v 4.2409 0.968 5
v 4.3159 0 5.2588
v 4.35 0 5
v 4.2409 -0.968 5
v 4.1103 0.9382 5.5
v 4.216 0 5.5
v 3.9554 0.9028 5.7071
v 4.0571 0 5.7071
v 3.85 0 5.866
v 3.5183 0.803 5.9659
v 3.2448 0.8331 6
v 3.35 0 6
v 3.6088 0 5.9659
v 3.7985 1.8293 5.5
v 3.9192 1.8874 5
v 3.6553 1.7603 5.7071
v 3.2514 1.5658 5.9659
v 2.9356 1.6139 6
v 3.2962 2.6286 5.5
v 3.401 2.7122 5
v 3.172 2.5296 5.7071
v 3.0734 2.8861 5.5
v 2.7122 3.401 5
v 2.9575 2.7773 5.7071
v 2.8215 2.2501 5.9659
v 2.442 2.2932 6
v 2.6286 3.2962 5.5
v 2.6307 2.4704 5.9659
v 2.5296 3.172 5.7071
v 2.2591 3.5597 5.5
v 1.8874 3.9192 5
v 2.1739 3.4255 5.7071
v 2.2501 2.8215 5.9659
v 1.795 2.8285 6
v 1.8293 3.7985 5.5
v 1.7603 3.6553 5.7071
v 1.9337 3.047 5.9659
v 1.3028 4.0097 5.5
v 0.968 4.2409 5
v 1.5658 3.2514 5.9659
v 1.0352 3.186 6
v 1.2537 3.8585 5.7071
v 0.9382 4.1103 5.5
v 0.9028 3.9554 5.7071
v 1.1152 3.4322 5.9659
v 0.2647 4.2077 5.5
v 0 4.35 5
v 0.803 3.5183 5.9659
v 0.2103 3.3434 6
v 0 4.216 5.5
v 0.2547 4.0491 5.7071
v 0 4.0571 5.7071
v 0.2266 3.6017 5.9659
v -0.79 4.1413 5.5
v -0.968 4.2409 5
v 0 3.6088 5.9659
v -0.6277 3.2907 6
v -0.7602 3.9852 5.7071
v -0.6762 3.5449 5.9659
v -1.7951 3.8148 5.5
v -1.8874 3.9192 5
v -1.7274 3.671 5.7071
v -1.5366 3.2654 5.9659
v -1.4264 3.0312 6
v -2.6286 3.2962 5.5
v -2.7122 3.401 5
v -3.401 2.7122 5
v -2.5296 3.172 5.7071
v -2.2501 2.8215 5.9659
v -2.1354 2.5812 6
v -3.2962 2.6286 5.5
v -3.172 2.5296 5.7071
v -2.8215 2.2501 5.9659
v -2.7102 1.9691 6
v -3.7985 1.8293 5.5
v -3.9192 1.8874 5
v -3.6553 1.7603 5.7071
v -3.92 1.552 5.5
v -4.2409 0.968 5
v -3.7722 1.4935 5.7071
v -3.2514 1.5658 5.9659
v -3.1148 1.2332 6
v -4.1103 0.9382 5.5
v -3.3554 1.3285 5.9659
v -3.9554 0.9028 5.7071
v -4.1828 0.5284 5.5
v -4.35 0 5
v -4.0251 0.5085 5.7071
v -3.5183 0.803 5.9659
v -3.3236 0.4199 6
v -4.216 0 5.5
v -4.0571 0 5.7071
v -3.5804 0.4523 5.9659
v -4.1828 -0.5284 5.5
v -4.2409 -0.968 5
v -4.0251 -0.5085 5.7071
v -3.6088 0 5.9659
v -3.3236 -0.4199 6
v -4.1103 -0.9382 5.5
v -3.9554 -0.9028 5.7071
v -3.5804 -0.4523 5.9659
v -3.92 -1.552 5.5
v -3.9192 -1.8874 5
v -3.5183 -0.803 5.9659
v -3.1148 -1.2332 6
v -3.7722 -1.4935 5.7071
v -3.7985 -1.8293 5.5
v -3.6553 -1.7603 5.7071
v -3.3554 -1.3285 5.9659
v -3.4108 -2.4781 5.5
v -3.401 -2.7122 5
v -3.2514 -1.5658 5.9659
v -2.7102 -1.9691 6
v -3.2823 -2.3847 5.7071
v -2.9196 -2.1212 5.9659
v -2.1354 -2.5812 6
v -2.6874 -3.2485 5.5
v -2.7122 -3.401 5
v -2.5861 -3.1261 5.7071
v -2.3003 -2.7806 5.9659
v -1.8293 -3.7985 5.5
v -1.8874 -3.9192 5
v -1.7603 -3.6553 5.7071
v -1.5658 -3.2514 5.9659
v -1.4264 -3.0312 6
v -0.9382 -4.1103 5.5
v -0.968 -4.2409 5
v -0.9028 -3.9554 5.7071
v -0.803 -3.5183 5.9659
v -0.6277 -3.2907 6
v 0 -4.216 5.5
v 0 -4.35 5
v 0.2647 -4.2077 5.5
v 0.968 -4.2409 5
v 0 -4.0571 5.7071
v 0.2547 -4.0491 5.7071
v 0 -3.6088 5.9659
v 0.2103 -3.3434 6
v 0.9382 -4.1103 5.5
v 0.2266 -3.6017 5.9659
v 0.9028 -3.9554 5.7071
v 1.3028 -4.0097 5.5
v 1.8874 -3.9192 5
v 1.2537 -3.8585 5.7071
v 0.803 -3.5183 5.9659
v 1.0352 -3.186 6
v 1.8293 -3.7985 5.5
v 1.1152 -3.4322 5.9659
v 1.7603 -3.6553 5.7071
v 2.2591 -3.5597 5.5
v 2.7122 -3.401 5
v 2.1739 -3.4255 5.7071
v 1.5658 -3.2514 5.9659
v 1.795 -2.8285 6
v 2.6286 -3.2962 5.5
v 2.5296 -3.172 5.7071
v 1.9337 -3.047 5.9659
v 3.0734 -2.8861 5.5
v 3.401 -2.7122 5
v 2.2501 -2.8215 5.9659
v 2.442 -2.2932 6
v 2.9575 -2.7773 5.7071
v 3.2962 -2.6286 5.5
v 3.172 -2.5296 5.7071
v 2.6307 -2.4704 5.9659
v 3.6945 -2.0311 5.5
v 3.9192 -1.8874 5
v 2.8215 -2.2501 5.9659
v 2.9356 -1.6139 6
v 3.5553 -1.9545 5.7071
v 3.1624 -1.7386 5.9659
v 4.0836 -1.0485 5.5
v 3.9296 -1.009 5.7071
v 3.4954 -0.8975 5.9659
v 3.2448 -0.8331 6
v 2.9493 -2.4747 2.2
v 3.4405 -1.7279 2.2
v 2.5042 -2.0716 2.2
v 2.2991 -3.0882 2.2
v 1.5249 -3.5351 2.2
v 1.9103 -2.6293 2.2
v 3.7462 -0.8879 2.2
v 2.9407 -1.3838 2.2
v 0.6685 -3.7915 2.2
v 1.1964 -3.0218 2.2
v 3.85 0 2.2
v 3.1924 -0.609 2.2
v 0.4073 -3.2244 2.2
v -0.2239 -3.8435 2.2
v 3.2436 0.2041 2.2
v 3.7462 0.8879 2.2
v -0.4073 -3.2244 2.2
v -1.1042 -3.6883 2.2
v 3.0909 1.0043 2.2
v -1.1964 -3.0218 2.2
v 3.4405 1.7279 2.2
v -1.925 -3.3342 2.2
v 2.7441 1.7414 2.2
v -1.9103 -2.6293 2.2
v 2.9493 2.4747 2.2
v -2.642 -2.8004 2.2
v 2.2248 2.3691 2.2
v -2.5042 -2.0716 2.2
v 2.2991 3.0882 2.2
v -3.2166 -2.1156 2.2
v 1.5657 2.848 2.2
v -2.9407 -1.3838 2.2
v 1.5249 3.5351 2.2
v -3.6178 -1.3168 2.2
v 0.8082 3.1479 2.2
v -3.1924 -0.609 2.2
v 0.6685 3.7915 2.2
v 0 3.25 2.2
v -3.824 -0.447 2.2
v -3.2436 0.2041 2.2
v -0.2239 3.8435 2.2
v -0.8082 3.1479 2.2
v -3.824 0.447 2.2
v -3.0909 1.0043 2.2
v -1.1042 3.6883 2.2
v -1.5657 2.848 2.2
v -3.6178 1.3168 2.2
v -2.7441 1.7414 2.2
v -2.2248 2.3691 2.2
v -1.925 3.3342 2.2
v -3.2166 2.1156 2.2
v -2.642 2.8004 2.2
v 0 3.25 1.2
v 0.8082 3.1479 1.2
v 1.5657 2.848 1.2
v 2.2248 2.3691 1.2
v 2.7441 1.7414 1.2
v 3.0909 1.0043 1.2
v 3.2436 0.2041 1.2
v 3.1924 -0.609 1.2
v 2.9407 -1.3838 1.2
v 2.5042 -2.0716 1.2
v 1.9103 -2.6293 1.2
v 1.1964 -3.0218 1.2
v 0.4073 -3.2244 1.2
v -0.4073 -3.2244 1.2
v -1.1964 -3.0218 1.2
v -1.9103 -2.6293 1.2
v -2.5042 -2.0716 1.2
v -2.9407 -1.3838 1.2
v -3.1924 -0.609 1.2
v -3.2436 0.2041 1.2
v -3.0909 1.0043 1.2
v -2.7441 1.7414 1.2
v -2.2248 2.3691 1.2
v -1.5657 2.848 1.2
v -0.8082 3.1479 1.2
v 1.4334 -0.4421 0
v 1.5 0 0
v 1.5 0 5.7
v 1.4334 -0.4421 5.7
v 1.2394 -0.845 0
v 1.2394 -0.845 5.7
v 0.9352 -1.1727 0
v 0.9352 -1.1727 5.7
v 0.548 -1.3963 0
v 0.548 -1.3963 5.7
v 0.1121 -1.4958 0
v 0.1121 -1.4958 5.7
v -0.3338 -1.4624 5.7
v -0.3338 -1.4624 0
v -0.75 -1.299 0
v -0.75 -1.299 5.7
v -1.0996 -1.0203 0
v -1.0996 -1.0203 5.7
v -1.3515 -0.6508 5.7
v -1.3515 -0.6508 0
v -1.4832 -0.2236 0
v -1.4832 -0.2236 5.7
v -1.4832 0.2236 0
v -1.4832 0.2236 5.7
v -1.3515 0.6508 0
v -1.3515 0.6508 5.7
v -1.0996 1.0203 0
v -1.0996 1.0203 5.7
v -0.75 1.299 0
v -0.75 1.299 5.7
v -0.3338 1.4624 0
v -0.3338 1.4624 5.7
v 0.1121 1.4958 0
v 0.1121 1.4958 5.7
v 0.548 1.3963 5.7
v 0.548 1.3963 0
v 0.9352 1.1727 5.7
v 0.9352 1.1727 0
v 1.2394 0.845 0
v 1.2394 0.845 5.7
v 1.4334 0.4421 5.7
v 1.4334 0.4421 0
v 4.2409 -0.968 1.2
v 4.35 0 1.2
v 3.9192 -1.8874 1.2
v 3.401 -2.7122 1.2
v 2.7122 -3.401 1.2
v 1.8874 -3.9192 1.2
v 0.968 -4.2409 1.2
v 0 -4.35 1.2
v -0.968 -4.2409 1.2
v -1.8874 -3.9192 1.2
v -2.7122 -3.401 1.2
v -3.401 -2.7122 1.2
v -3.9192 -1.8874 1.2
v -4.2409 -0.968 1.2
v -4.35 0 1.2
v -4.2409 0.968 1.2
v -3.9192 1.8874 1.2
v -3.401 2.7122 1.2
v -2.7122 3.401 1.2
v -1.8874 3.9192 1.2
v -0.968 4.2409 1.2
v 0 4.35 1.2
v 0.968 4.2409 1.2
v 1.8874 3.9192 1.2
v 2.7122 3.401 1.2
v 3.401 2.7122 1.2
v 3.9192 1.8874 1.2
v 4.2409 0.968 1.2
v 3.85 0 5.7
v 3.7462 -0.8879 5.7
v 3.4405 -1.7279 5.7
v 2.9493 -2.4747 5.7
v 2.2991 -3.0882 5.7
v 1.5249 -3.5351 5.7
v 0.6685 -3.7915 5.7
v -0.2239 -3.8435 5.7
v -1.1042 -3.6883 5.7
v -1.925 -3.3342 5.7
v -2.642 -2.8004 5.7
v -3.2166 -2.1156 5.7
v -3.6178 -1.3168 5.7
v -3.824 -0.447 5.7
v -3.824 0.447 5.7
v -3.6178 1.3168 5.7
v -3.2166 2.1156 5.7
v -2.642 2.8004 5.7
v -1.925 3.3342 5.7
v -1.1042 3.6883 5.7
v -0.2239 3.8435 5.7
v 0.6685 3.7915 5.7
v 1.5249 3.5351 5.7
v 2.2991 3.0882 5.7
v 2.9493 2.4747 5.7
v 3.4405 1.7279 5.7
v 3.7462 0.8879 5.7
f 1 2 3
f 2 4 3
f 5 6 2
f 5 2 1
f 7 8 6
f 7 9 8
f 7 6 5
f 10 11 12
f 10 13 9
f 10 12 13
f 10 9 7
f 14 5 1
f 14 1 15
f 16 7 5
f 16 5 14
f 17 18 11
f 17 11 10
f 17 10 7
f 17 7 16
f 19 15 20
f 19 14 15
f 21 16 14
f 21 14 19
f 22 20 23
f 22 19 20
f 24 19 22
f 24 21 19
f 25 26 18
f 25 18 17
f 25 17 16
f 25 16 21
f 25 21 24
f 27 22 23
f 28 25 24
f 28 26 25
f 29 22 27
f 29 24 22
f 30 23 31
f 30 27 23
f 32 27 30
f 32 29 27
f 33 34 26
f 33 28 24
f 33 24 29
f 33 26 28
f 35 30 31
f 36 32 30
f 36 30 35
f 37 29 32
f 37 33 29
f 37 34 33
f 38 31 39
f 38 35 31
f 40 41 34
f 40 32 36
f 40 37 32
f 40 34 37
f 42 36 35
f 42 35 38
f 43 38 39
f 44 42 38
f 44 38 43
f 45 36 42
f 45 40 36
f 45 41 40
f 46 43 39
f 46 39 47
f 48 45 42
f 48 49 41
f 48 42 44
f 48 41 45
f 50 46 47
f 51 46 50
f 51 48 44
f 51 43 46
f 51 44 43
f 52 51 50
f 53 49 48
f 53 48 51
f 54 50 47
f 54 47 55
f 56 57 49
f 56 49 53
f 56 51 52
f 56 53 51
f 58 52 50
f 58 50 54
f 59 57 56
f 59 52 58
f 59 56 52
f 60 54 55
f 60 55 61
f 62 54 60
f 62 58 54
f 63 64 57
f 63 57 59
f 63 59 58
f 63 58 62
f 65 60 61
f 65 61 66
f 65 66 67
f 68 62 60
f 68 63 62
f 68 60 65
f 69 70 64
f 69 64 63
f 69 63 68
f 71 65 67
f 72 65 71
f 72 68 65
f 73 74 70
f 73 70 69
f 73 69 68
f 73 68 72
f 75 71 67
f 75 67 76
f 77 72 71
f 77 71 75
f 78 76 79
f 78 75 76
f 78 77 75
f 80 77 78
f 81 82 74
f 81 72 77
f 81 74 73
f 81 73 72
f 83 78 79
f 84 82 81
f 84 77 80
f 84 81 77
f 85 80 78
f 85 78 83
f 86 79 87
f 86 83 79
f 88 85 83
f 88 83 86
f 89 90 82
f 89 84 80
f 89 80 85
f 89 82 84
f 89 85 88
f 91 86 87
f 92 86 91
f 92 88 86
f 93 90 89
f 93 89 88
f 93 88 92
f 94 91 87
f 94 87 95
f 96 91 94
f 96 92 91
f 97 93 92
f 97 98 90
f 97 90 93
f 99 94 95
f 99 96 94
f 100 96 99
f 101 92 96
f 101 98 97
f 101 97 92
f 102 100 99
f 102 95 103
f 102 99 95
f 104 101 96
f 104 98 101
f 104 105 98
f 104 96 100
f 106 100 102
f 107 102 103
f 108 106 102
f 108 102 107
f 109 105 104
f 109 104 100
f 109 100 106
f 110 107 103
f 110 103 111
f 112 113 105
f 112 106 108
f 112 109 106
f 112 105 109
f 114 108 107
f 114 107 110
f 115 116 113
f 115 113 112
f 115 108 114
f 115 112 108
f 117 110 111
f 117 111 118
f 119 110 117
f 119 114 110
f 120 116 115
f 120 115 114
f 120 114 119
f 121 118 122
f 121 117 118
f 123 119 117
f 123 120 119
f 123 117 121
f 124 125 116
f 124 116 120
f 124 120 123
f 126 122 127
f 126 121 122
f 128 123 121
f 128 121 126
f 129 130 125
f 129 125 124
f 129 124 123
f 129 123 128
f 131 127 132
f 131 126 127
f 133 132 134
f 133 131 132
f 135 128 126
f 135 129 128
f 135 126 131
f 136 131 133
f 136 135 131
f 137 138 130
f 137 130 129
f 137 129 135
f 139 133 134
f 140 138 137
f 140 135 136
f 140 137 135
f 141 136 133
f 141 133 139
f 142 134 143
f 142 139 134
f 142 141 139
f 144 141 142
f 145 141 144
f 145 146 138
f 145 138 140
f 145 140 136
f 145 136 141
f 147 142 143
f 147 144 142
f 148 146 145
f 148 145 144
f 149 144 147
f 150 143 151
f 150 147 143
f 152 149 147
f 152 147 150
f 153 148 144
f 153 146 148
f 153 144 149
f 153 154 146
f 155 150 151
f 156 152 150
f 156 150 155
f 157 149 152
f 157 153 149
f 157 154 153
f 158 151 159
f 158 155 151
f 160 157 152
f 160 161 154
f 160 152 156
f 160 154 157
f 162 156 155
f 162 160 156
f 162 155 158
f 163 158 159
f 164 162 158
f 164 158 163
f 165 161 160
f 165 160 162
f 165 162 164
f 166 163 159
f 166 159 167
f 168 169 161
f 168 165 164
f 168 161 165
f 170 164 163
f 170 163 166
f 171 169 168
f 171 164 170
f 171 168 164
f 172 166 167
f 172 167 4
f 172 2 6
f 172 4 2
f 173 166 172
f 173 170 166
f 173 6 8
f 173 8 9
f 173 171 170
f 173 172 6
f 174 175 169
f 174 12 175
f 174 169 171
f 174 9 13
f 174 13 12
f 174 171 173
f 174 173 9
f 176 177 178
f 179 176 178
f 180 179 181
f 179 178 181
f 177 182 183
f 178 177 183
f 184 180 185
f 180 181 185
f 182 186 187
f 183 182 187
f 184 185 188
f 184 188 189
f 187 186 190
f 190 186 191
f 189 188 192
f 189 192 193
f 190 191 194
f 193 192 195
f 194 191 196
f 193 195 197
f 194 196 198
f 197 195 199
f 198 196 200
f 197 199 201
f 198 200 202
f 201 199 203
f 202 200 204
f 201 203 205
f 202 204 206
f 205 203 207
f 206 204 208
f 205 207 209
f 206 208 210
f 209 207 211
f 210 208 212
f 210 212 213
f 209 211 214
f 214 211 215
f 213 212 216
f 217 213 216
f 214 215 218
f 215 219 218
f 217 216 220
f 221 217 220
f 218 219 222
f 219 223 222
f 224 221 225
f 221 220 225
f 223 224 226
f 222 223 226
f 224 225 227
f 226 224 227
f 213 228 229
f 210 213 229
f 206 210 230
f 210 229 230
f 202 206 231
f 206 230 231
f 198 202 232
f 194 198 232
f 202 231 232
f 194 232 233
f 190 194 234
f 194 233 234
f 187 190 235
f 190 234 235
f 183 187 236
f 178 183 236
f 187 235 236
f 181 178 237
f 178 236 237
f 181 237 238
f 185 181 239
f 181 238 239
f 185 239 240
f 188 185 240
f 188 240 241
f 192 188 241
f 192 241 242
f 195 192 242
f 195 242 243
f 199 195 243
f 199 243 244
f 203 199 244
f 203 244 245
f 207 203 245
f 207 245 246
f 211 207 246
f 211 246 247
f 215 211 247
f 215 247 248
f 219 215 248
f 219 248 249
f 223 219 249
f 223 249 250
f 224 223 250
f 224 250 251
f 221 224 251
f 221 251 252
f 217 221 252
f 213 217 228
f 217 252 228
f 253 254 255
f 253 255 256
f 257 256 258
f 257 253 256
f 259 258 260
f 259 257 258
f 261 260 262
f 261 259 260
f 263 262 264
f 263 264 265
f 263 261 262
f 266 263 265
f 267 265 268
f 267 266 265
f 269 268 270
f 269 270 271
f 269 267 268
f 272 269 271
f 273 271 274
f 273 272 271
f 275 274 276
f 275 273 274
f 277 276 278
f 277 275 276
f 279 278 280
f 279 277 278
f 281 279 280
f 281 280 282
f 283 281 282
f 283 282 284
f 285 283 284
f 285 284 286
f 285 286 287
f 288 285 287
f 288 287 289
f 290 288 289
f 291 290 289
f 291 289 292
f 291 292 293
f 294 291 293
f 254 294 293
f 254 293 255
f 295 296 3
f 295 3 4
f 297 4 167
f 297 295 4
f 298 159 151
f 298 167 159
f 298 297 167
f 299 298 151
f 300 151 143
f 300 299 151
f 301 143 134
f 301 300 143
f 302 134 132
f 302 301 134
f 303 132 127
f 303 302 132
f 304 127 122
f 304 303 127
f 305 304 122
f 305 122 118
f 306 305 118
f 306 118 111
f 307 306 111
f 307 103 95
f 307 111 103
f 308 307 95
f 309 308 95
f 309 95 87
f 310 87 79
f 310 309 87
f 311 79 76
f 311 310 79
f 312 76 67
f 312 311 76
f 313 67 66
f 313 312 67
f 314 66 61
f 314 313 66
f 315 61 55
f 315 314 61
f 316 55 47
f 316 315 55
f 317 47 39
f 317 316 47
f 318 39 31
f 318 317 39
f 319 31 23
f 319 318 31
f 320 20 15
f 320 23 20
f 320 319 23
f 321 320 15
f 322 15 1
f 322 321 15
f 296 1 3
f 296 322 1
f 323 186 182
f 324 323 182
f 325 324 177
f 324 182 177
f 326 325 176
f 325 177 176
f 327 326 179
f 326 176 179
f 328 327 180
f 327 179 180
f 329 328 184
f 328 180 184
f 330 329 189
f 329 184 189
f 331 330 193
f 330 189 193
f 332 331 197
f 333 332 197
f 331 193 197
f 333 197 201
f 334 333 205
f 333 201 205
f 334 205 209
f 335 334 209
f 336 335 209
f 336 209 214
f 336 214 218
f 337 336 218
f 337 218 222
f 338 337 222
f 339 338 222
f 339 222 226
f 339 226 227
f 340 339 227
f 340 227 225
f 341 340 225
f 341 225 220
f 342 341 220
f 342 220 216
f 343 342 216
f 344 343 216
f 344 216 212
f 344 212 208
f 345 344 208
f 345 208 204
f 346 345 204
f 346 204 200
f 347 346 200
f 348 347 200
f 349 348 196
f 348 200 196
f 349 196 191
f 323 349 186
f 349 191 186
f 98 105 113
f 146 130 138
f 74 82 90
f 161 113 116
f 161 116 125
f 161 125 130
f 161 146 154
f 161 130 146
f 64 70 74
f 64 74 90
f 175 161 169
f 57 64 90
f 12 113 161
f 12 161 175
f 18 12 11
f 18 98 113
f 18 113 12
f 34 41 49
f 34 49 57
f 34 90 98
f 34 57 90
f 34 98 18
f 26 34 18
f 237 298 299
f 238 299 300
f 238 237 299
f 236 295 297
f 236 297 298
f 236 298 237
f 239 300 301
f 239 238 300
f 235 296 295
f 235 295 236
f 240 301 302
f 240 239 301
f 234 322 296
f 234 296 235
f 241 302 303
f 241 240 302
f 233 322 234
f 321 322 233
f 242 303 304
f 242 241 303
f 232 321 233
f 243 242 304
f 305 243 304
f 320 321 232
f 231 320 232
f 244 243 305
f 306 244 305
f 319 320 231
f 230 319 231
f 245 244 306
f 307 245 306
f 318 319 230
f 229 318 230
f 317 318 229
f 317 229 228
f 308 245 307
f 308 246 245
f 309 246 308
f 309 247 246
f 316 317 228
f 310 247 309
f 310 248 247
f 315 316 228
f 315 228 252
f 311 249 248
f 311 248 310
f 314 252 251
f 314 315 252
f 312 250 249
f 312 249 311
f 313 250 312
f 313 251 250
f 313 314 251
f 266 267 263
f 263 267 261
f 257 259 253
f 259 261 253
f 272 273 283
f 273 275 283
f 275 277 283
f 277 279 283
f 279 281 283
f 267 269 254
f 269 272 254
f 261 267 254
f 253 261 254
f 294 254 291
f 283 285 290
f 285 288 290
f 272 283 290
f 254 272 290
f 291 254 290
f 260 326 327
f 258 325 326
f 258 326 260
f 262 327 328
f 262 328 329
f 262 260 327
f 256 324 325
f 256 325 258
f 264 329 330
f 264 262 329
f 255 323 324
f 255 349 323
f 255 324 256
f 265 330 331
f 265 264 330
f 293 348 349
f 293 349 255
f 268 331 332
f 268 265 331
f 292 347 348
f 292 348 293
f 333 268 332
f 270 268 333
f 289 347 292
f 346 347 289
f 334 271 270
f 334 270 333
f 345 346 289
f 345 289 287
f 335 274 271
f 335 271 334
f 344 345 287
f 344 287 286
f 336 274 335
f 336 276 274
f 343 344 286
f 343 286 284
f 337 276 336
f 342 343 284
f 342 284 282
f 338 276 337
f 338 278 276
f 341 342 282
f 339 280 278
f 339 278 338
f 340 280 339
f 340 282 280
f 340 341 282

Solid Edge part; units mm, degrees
sketch "Sketch1" plane through (0, 0, 0) normal (0, 0, 1) x (1, 0, 0)
  circle A0 centre (0, 0) radius 4.35
extrude "Protrusion1" add sketch "Sketch1" along normal blind 6
sketch "Sketch2" plane through (0, 0, 0) normal (0, 0, -1) x (1, 0, 0)
  circle A0 centre (0, 0) radius 5.5081
  circle A1 centre (0, 0) radius 1.5
extrude "Wycięcie_1" cut sketch "Sketch2" against normal blind 1.2
sketch "Sketch3" plane through (0, 0, 1.2) normal (0, 0, -1) x (1, 0, 0)
  circle A0 centre (0, 0) radius 3.85
  circle A1 centre (0, 0) radius 1.5
extrude "Wycięcie_2" cut sketch "Sketch3" against normal blind 4.5
sketch "Sketch4" plane through (0, 0, 1.2) normal (0, 0, -1) x (0, 1, 0)
  circle A0 centre (0, 0) radius 3.25
  circle A1 centre (0, 0) radius 4
  dimension "D1" = 6.5
extrude "Wyciągnięcie_2" add sketch "Sketch4" against normal blind 1
fillet "Zaokrąglenie_1" radius 1 1 edges at (-4.35, 0, 6)
